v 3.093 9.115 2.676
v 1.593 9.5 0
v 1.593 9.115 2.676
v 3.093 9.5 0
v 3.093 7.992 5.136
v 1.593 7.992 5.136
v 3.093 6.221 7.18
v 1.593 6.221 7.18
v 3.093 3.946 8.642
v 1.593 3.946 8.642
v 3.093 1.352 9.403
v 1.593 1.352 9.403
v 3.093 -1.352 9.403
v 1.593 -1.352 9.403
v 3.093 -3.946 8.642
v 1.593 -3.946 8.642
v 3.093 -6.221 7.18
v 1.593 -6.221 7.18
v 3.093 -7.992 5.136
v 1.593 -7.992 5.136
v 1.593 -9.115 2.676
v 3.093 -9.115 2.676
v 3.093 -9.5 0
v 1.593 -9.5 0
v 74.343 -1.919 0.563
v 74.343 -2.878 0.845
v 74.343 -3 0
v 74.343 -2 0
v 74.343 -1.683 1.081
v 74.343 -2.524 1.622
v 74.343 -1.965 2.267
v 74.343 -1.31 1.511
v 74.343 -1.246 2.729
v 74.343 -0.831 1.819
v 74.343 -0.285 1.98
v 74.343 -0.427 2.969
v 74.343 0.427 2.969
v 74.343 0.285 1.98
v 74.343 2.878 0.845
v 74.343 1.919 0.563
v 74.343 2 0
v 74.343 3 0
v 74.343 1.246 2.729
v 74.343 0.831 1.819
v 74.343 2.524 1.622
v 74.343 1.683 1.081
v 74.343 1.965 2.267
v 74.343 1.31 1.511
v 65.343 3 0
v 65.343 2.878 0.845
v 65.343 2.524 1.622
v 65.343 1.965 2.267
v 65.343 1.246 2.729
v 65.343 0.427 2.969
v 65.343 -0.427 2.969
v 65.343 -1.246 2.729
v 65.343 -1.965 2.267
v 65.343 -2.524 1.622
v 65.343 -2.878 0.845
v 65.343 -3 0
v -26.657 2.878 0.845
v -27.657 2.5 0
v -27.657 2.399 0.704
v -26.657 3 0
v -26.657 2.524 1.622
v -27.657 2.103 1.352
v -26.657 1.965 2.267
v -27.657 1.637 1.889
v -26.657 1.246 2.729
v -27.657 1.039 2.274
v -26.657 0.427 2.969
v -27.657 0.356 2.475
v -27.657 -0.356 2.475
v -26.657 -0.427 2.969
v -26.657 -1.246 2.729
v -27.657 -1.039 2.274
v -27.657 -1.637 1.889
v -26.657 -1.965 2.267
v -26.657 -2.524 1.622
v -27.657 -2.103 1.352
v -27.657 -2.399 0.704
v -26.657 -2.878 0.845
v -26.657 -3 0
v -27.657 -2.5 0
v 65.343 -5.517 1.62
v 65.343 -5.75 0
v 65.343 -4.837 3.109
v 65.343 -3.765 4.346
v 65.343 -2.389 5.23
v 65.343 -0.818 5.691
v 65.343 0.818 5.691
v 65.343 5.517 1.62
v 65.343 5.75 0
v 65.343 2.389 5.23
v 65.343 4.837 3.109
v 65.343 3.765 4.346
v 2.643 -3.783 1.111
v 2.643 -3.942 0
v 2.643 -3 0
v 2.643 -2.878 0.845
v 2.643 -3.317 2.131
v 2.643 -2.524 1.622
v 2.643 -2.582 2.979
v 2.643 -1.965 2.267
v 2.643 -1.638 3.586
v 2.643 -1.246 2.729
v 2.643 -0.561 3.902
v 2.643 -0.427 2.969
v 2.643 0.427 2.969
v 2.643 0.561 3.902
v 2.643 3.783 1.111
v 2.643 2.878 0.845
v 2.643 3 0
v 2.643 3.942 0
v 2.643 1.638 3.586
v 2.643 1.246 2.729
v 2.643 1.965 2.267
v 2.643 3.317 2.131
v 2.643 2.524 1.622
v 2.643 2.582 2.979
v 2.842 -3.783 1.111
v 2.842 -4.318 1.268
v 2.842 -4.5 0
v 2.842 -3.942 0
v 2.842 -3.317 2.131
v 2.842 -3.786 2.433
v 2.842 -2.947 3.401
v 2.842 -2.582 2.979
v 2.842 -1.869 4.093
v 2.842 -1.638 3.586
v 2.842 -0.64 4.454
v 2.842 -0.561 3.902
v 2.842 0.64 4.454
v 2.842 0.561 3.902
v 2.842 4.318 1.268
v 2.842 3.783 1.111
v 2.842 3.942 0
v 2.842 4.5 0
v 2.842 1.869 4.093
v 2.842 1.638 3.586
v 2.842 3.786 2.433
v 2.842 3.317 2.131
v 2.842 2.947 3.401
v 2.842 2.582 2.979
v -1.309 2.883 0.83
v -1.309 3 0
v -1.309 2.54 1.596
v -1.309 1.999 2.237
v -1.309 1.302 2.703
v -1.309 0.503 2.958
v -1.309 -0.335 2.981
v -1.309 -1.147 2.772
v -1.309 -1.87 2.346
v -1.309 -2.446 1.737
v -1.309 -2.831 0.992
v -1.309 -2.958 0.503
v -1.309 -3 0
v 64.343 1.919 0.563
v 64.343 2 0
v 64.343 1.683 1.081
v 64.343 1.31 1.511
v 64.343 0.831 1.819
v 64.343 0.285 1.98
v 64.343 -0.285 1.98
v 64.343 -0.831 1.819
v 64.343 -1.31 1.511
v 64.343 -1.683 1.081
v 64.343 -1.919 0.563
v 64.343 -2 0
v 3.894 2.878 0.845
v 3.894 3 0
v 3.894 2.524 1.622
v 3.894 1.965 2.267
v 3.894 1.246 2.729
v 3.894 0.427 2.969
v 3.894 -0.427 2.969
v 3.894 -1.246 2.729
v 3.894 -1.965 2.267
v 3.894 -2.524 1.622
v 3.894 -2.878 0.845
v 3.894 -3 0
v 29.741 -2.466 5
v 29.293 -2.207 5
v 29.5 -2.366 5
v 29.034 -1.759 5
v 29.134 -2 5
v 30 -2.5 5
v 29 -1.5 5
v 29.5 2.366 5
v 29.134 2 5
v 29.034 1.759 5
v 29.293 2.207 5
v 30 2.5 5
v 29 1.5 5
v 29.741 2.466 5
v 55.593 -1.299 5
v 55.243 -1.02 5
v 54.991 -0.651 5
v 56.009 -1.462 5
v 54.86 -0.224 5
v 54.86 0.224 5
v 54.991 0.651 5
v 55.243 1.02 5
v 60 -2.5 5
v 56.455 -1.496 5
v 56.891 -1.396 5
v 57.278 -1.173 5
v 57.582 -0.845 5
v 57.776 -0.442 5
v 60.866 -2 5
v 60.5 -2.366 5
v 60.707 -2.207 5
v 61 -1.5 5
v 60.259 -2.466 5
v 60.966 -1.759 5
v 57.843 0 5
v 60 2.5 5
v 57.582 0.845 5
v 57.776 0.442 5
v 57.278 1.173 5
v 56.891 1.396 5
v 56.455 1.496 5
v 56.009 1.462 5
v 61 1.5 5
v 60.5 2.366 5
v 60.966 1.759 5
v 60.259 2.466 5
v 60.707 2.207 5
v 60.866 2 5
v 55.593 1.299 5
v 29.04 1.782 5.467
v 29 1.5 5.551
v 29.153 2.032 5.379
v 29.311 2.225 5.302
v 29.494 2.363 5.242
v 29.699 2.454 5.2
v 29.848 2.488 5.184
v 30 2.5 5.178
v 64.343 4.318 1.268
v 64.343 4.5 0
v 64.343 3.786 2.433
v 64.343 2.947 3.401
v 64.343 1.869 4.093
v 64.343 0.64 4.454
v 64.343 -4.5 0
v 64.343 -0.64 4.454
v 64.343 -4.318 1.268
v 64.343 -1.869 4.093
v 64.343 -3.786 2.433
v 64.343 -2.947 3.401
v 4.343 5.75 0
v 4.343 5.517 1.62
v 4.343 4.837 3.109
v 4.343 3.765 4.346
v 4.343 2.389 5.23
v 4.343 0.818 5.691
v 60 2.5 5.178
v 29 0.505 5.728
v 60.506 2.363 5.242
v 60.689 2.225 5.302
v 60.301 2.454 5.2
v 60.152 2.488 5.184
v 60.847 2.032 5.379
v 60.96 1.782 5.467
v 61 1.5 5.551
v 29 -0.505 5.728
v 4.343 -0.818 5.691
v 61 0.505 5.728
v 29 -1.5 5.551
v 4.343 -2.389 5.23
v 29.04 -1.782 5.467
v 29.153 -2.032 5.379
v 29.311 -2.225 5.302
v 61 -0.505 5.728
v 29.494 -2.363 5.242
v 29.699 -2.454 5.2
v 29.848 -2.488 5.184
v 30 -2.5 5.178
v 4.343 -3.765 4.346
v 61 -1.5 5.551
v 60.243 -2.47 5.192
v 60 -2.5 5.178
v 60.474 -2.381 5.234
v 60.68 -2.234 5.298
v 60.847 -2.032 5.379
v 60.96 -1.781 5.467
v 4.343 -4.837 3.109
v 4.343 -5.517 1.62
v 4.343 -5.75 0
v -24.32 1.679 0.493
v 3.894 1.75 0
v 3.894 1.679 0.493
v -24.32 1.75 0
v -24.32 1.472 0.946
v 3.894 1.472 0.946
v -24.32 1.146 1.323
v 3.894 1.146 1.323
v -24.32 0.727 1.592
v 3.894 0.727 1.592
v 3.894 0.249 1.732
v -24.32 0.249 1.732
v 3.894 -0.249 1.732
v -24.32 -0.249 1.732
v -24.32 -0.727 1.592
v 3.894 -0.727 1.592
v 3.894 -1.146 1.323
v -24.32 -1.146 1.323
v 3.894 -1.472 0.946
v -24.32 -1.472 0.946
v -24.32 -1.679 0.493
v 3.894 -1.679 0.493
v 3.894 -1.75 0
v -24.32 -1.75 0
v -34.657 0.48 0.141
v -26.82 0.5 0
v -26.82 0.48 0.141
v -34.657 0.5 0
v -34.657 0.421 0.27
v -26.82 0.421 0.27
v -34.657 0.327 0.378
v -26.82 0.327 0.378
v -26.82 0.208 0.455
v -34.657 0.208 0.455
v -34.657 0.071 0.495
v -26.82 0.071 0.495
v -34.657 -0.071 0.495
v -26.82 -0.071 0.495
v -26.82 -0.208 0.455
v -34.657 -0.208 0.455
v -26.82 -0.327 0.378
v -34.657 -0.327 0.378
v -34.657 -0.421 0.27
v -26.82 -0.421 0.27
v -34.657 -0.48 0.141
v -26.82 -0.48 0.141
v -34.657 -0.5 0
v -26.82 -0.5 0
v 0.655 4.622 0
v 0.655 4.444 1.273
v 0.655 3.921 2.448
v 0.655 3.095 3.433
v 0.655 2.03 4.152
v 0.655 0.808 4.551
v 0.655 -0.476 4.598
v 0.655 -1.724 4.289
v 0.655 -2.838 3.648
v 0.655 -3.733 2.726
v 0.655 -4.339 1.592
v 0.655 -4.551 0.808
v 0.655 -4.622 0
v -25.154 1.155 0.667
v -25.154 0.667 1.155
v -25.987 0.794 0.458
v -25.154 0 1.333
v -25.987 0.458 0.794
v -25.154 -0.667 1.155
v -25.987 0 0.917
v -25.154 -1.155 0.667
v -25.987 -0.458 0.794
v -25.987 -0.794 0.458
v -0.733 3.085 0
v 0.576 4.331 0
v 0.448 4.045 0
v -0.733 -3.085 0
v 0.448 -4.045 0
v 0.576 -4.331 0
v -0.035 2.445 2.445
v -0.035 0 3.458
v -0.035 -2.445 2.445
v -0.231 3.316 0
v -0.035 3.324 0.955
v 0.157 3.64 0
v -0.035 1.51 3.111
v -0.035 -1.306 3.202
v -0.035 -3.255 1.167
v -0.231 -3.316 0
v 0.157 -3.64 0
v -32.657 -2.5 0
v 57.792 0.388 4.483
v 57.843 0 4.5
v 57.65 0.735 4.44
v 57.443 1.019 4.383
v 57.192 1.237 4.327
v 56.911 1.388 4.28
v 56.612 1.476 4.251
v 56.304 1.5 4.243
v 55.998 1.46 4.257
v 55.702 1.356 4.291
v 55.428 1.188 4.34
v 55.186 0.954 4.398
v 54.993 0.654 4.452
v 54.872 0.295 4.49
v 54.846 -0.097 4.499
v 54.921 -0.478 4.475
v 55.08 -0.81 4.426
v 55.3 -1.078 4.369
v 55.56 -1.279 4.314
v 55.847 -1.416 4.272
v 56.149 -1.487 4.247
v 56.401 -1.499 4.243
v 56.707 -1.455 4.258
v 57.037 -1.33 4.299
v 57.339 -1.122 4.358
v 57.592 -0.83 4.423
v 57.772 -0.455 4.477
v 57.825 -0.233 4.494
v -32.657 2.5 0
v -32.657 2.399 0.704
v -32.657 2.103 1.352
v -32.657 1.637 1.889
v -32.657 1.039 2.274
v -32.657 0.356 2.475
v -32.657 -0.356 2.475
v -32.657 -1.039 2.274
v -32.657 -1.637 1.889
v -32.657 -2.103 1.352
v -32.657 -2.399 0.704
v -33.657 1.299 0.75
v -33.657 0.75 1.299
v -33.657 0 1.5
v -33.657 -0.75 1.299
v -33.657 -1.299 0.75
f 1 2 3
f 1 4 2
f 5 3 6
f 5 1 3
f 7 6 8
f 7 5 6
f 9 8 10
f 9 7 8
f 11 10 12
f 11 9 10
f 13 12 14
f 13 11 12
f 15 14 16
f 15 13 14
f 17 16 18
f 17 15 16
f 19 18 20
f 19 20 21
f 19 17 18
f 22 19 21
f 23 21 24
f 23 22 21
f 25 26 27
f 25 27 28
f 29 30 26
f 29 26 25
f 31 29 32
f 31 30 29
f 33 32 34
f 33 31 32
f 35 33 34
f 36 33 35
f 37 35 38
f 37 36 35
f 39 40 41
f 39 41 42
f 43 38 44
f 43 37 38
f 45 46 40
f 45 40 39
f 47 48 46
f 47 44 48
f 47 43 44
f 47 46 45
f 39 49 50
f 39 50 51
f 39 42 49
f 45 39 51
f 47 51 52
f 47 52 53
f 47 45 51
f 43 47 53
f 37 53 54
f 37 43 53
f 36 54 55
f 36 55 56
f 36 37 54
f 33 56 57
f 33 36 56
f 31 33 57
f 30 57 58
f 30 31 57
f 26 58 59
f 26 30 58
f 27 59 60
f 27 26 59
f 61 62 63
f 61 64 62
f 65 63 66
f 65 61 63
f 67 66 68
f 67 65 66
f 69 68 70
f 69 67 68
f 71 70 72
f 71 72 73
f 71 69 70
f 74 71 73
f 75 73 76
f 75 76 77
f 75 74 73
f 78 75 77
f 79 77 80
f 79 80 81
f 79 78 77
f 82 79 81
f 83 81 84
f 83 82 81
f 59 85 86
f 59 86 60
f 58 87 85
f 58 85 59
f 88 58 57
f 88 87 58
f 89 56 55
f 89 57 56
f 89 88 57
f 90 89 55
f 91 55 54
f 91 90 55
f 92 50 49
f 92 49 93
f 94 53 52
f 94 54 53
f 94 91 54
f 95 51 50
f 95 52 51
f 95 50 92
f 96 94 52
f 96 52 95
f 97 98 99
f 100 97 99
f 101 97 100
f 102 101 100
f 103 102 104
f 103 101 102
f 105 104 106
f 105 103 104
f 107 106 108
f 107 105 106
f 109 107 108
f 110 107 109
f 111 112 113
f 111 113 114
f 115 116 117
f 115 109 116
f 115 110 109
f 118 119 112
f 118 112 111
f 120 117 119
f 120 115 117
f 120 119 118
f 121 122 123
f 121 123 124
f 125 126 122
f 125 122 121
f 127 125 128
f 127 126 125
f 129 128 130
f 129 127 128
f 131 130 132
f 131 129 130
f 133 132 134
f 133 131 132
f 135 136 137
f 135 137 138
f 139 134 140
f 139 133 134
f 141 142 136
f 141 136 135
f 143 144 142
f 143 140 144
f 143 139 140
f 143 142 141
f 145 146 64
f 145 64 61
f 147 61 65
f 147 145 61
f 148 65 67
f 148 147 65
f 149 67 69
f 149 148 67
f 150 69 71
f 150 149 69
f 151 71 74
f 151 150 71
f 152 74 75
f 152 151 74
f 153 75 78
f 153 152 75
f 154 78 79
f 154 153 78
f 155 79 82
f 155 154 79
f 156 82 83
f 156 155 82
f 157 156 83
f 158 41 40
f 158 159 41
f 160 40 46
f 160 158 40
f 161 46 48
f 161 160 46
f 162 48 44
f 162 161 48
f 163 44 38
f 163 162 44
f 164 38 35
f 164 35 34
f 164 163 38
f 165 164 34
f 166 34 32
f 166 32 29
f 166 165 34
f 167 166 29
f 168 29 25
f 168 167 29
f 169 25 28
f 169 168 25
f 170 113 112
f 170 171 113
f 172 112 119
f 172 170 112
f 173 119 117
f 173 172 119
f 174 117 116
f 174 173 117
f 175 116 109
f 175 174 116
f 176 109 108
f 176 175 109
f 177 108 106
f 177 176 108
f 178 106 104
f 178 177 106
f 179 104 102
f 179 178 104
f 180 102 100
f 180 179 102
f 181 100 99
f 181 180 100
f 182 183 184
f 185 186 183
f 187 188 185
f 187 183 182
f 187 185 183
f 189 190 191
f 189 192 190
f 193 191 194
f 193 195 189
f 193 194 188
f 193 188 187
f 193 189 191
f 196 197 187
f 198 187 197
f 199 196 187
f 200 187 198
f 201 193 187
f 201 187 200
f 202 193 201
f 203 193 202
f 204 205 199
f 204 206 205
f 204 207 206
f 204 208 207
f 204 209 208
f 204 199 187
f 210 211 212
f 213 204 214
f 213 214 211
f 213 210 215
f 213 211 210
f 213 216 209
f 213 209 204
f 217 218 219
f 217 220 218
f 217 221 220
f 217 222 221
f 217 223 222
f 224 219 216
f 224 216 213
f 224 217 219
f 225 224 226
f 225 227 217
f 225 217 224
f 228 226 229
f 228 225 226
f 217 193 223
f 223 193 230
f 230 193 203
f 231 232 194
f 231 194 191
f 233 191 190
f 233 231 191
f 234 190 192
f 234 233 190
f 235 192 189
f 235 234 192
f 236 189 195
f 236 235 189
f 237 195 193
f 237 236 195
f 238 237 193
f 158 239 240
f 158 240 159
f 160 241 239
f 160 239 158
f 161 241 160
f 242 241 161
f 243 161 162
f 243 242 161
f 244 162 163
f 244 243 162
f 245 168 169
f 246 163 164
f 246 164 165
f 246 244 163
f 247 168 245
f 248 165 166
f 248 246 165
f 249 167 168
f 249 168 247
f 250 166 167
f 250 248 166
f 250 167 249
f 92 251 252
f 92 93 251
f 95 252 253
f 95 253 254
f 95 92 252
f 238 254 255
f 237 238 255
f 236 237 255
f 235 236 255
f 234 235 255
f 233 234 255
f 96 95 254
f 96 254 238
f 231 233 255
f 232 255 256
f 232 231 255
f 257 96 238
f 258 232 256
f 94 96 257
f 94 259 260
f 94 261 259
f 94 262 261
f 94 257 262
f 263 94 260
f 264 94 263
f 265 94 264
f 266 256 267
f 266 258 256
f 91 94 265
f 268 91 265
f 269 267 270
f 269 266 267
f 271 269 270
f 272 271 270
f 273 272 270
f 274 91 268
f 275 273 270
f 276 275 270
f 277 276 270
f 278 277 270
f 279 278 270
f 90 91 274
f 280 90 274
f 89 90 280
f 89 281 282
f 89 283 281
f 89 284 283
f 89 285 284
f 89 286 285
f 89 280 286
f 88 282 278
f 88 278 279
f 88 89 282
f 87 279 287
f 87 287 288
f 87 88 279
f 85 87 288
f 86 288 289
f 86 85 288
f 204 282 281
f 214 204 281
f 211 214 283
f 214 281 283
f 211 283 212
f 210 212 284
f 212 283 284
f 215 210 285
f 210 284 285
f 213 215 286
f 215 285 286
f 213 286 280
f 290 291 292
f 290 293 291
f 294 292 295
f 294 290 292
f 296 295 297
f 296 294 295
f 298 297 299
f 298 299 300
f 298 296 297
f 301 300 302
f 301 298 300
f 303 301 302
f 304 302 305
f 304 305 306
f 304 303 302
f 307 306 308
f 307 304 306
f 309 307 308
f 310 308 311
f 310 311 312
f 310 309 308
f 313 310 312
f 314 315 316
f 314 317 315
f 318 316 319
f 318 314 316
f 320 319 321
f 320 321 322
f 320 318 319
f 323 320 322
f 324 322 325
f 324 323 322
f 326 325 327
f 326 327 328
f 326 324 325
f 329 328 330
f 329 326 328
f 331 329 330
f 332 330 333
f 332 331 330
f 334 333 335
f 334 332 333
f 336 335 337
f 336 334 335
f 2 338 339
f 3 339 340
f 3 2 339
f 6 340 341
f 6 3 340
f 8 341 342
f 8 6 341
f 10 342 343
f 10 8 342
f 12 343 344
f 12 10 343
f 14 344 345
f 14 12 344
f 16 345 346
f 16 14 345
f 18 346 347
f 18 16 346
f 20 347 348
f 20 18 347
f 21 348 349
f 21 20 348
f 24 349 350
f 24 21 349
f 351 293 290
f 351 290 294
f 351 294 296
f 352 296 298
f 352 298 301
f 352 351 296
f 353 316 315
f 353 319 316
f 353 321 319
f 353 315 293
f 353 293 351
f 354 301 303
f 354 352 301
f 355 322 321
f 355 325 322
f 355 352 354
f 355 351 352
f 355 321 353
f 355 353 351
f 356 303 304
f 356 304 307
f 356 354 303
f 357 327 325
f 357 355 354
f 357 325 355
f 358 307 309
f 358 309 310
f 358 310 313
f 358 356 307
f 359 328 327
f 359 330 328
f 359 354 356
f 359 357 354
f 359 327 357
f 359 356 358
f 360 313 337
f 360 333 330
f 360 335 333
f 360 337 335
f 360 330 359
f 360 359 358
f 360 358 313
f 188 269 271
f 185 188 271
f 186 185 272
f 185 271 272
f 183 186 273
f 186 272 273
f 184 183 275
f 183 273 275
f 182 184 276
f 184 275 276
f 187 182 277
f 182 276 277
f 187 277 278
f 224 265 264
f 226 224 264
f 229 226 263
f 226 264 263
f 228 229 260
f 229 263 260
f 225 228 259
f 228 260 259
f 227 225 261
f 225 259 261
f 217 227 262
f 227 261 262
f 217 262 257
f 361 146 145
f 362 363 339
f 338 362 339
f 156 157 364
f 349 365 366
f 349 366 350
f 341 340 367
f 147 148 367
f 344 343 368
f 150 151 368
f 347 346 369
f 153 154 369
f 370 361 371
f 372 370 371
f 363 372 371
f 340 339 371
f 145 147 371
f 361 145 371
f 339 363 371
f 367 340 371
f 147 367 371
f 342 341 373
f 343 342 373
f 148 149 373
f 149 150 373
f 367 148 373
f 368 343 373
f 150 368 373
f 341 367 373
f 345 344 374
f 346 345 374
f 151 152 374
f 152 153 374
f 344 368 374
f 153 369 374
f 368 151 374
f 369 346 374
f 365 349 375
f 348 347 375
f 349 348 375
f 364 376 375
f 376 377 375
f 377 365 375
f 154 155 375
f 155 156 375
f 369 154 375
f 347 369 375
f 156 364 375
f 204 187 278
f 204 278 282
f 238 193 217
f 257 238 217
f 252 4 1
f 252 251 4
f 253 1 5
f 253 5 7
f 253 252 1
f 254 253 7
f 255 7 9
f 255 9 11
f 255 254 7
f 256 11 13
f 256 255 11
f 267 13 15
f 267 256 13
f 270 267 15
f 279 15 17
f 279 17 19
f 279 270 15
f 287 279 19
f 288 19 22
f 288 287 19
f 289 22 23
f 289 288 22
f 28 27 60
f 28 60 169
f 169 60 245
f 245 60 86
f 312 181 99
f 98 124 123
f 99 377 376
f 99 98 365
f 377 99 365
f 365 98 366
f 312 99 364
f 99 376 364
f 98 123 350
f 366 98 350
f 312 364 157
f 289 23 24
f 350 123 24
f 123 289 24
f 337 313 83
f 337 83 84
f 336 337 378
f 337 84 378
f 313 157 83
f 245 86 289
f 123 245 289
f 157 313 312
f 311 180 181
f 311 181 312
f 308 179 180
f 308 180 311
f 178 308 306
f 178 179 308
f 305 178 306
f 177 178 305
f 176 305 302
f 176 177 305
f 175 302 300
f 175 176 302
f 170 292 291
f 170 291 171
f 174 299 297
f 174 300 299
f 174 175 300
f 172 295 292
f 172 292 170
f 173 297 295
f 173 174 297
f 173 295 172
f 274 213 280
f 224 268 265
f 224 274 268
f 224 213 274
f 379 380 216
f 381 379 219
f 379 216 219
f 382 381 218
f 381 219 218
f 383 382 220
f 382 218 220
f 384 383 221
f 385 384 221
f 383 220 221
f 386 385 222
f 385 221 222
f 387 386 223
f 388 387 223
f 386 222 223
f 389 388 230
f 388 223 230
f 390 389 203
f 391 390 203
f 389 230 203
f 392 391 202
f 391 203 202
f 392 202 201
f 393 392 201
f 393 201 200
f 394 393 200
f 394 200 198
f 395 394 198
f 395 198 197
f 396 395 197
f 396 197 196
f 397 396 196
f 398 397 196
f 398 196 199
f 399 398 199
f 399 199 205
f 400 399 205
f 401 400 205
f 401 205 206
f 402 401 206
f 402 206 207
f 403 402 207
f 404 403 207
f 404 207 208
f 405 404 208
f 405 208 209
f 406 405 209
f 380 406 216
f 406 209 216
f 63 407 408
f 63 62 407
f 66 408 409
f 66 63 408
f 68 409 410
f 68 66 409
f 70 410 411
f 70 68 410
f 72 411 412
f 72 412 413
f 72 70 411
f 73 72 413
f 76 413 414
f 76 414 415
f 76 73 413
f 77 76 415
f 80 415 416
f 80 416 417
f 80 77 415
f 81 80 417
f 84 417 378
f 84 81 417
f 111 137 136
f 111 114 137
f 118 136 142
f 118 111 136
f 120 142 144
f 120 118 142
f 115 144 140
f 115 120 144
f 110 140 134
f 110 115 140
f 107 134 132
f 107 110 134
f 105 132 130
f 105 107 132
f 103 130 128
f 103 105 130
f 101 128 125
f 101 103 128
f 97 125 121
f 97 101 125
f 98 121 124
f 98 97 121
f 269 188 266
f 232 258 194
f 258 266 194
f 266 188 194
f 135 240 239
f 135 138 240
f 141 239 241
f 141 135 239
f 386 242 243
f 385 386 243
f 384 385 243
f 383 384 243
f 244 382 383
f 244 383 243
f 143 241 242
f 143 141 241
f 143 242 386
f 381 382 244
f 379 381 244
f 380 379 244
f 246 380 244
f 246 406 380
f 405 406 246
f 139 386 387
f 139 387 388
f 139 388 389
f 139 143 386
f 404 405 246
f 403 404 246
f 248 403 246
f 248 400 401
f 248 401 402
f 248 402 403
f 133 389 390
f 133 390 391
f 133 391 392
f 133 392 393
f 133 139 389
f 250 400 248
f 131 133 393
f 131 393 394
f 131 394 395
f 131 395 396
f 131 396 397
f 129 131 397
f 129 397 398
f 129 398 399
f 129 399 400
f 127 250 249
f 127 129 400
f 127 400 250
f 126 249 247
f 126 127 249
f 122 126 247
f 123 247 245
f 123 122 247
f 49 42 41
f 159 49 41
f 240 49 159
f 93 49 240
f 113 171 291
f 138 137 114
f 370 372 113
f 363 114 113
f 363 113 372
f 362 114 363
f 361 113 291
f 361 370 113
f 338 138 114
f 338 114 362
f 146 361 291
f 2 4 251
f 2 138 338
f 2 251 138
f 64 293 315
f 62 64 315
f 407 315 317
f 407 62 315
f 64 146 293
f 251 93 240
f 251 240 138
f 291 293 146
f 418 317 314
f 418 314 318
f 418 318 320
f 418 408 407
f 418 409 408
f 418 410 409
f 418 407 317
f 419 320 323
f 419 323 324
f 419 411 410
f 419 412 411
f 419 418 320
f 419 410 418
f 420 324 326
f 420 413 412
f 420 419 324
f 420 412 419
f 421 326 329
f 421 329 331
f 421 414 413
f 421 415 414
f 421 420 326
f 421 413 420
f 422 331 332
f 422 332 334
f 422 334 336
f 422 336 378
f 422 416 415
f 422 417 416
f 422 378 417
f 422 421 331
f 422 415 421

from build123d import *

# Parameters (mm, degrees)
SKETCH005_W      = 32
SKETCH005_H      = 5
PAD002_DEPTH     = 10
FILLET_R         = 1
FILLET001_R      = 1
FILLET002_R      = 1
FILLET003_R      = 1
REVOLUTION_ANGLE = 180
SKETCH006_R      = 1.5
POCKET_DEPTH     = 5
FILLET004_R      = 2


with BuildPart() as boolback:
    # Sketch005 → Pad002 (new body)
    with BuildSketch(Plane.XY):
        with Locations((45, 0)):
            Rectangle(SKETCH005_W, SKETCH005_H)
    extrude(amount=PAD002_DEPTH)

    # Fillet
    fillet_edges = [boolback.edges().sort_by_distance(p)[0] for p in [
        (29, -2.5, 5),
    ]]
    fillet(fillet_edges, radius=FILLET_R)

    # Fillet001
    fillet001_edges = [boolback.edges().sort_by_distance(p)[0] for p in [
        (29, 2.5, 5),
    ]]
    fillet(fillet001_edges, radius=FILLET001_R)

    # Fillet002
    fillet002_edges = [boolback.edges().sort_by_distance(p)[0] for p in [
        (61, -2.5, 5),
    ]]
    fillet(fillet002_edges, radius=FILLET002_R)

    # Fillet003
    fillet003_edges = [boolback.edges().sort_by_distance(p)[0] for p in [
        (61, 2.5, 5),
    ]]
    fillet(fillet003_edges, radius=FILLET003_R)


with BuildPart() as boolback_1:
    # Body006 placement: moved
    add(boolback.part.moved(Location((0, 0, 5))))


with BuildPart() as half:
    # Sketch → Revolution (revolve)
    with BuildSketch(Plane.XY):
        Polygon((-34.657143, 0.5), (-32.657143, 2.5), (-27.657143, 2.5), (-26.657143, 3), (0.342857, 3), (1.592857, 9.5), (3.092857, 9.5), (4.342857, 5.75), (65.342857, 5.75), (65.342857, 3), (74.342857, 3), (74.342857, 2), (64.342857, 2), (64.342857, 4.5), (2.842015, 4.5), (2.842015, 3.942434), (2.64252, 3.942434), (2.64252, 3), (3.894188, 3), (3.894188, 1.75), (-24.320252, 1.75), (-26.820252, 0.5), align=None)
    revolve(axis=Axis((0, 0, 0), (1, 0, 0)), revolution_arc=REVOLUTION_ANGLE)

    # Boolean002: cut BoolBACK
    add(boolback_1.part, mode=Mode.SUBTRACT)

    # Sketch006 (on Face33 of Boolean002) → Pocket (cut)
    with BuildSketch(Plane.XY.offset(5)):
        with Locations((56.342857, 0)):
            Circle(SKETCH006_R)
    extrude(amount=-POCKET_DEPTH, mode=Mode.SUBTRACT)

    # Fillet004
    fillet004_edges = [half.edges().sort_by_distance(p)[0] for p in [
        (0.342857, 0, 3),
    ]]
    fillet(fillet004_edges, radius=FILLET004_R)


solid = half.part
